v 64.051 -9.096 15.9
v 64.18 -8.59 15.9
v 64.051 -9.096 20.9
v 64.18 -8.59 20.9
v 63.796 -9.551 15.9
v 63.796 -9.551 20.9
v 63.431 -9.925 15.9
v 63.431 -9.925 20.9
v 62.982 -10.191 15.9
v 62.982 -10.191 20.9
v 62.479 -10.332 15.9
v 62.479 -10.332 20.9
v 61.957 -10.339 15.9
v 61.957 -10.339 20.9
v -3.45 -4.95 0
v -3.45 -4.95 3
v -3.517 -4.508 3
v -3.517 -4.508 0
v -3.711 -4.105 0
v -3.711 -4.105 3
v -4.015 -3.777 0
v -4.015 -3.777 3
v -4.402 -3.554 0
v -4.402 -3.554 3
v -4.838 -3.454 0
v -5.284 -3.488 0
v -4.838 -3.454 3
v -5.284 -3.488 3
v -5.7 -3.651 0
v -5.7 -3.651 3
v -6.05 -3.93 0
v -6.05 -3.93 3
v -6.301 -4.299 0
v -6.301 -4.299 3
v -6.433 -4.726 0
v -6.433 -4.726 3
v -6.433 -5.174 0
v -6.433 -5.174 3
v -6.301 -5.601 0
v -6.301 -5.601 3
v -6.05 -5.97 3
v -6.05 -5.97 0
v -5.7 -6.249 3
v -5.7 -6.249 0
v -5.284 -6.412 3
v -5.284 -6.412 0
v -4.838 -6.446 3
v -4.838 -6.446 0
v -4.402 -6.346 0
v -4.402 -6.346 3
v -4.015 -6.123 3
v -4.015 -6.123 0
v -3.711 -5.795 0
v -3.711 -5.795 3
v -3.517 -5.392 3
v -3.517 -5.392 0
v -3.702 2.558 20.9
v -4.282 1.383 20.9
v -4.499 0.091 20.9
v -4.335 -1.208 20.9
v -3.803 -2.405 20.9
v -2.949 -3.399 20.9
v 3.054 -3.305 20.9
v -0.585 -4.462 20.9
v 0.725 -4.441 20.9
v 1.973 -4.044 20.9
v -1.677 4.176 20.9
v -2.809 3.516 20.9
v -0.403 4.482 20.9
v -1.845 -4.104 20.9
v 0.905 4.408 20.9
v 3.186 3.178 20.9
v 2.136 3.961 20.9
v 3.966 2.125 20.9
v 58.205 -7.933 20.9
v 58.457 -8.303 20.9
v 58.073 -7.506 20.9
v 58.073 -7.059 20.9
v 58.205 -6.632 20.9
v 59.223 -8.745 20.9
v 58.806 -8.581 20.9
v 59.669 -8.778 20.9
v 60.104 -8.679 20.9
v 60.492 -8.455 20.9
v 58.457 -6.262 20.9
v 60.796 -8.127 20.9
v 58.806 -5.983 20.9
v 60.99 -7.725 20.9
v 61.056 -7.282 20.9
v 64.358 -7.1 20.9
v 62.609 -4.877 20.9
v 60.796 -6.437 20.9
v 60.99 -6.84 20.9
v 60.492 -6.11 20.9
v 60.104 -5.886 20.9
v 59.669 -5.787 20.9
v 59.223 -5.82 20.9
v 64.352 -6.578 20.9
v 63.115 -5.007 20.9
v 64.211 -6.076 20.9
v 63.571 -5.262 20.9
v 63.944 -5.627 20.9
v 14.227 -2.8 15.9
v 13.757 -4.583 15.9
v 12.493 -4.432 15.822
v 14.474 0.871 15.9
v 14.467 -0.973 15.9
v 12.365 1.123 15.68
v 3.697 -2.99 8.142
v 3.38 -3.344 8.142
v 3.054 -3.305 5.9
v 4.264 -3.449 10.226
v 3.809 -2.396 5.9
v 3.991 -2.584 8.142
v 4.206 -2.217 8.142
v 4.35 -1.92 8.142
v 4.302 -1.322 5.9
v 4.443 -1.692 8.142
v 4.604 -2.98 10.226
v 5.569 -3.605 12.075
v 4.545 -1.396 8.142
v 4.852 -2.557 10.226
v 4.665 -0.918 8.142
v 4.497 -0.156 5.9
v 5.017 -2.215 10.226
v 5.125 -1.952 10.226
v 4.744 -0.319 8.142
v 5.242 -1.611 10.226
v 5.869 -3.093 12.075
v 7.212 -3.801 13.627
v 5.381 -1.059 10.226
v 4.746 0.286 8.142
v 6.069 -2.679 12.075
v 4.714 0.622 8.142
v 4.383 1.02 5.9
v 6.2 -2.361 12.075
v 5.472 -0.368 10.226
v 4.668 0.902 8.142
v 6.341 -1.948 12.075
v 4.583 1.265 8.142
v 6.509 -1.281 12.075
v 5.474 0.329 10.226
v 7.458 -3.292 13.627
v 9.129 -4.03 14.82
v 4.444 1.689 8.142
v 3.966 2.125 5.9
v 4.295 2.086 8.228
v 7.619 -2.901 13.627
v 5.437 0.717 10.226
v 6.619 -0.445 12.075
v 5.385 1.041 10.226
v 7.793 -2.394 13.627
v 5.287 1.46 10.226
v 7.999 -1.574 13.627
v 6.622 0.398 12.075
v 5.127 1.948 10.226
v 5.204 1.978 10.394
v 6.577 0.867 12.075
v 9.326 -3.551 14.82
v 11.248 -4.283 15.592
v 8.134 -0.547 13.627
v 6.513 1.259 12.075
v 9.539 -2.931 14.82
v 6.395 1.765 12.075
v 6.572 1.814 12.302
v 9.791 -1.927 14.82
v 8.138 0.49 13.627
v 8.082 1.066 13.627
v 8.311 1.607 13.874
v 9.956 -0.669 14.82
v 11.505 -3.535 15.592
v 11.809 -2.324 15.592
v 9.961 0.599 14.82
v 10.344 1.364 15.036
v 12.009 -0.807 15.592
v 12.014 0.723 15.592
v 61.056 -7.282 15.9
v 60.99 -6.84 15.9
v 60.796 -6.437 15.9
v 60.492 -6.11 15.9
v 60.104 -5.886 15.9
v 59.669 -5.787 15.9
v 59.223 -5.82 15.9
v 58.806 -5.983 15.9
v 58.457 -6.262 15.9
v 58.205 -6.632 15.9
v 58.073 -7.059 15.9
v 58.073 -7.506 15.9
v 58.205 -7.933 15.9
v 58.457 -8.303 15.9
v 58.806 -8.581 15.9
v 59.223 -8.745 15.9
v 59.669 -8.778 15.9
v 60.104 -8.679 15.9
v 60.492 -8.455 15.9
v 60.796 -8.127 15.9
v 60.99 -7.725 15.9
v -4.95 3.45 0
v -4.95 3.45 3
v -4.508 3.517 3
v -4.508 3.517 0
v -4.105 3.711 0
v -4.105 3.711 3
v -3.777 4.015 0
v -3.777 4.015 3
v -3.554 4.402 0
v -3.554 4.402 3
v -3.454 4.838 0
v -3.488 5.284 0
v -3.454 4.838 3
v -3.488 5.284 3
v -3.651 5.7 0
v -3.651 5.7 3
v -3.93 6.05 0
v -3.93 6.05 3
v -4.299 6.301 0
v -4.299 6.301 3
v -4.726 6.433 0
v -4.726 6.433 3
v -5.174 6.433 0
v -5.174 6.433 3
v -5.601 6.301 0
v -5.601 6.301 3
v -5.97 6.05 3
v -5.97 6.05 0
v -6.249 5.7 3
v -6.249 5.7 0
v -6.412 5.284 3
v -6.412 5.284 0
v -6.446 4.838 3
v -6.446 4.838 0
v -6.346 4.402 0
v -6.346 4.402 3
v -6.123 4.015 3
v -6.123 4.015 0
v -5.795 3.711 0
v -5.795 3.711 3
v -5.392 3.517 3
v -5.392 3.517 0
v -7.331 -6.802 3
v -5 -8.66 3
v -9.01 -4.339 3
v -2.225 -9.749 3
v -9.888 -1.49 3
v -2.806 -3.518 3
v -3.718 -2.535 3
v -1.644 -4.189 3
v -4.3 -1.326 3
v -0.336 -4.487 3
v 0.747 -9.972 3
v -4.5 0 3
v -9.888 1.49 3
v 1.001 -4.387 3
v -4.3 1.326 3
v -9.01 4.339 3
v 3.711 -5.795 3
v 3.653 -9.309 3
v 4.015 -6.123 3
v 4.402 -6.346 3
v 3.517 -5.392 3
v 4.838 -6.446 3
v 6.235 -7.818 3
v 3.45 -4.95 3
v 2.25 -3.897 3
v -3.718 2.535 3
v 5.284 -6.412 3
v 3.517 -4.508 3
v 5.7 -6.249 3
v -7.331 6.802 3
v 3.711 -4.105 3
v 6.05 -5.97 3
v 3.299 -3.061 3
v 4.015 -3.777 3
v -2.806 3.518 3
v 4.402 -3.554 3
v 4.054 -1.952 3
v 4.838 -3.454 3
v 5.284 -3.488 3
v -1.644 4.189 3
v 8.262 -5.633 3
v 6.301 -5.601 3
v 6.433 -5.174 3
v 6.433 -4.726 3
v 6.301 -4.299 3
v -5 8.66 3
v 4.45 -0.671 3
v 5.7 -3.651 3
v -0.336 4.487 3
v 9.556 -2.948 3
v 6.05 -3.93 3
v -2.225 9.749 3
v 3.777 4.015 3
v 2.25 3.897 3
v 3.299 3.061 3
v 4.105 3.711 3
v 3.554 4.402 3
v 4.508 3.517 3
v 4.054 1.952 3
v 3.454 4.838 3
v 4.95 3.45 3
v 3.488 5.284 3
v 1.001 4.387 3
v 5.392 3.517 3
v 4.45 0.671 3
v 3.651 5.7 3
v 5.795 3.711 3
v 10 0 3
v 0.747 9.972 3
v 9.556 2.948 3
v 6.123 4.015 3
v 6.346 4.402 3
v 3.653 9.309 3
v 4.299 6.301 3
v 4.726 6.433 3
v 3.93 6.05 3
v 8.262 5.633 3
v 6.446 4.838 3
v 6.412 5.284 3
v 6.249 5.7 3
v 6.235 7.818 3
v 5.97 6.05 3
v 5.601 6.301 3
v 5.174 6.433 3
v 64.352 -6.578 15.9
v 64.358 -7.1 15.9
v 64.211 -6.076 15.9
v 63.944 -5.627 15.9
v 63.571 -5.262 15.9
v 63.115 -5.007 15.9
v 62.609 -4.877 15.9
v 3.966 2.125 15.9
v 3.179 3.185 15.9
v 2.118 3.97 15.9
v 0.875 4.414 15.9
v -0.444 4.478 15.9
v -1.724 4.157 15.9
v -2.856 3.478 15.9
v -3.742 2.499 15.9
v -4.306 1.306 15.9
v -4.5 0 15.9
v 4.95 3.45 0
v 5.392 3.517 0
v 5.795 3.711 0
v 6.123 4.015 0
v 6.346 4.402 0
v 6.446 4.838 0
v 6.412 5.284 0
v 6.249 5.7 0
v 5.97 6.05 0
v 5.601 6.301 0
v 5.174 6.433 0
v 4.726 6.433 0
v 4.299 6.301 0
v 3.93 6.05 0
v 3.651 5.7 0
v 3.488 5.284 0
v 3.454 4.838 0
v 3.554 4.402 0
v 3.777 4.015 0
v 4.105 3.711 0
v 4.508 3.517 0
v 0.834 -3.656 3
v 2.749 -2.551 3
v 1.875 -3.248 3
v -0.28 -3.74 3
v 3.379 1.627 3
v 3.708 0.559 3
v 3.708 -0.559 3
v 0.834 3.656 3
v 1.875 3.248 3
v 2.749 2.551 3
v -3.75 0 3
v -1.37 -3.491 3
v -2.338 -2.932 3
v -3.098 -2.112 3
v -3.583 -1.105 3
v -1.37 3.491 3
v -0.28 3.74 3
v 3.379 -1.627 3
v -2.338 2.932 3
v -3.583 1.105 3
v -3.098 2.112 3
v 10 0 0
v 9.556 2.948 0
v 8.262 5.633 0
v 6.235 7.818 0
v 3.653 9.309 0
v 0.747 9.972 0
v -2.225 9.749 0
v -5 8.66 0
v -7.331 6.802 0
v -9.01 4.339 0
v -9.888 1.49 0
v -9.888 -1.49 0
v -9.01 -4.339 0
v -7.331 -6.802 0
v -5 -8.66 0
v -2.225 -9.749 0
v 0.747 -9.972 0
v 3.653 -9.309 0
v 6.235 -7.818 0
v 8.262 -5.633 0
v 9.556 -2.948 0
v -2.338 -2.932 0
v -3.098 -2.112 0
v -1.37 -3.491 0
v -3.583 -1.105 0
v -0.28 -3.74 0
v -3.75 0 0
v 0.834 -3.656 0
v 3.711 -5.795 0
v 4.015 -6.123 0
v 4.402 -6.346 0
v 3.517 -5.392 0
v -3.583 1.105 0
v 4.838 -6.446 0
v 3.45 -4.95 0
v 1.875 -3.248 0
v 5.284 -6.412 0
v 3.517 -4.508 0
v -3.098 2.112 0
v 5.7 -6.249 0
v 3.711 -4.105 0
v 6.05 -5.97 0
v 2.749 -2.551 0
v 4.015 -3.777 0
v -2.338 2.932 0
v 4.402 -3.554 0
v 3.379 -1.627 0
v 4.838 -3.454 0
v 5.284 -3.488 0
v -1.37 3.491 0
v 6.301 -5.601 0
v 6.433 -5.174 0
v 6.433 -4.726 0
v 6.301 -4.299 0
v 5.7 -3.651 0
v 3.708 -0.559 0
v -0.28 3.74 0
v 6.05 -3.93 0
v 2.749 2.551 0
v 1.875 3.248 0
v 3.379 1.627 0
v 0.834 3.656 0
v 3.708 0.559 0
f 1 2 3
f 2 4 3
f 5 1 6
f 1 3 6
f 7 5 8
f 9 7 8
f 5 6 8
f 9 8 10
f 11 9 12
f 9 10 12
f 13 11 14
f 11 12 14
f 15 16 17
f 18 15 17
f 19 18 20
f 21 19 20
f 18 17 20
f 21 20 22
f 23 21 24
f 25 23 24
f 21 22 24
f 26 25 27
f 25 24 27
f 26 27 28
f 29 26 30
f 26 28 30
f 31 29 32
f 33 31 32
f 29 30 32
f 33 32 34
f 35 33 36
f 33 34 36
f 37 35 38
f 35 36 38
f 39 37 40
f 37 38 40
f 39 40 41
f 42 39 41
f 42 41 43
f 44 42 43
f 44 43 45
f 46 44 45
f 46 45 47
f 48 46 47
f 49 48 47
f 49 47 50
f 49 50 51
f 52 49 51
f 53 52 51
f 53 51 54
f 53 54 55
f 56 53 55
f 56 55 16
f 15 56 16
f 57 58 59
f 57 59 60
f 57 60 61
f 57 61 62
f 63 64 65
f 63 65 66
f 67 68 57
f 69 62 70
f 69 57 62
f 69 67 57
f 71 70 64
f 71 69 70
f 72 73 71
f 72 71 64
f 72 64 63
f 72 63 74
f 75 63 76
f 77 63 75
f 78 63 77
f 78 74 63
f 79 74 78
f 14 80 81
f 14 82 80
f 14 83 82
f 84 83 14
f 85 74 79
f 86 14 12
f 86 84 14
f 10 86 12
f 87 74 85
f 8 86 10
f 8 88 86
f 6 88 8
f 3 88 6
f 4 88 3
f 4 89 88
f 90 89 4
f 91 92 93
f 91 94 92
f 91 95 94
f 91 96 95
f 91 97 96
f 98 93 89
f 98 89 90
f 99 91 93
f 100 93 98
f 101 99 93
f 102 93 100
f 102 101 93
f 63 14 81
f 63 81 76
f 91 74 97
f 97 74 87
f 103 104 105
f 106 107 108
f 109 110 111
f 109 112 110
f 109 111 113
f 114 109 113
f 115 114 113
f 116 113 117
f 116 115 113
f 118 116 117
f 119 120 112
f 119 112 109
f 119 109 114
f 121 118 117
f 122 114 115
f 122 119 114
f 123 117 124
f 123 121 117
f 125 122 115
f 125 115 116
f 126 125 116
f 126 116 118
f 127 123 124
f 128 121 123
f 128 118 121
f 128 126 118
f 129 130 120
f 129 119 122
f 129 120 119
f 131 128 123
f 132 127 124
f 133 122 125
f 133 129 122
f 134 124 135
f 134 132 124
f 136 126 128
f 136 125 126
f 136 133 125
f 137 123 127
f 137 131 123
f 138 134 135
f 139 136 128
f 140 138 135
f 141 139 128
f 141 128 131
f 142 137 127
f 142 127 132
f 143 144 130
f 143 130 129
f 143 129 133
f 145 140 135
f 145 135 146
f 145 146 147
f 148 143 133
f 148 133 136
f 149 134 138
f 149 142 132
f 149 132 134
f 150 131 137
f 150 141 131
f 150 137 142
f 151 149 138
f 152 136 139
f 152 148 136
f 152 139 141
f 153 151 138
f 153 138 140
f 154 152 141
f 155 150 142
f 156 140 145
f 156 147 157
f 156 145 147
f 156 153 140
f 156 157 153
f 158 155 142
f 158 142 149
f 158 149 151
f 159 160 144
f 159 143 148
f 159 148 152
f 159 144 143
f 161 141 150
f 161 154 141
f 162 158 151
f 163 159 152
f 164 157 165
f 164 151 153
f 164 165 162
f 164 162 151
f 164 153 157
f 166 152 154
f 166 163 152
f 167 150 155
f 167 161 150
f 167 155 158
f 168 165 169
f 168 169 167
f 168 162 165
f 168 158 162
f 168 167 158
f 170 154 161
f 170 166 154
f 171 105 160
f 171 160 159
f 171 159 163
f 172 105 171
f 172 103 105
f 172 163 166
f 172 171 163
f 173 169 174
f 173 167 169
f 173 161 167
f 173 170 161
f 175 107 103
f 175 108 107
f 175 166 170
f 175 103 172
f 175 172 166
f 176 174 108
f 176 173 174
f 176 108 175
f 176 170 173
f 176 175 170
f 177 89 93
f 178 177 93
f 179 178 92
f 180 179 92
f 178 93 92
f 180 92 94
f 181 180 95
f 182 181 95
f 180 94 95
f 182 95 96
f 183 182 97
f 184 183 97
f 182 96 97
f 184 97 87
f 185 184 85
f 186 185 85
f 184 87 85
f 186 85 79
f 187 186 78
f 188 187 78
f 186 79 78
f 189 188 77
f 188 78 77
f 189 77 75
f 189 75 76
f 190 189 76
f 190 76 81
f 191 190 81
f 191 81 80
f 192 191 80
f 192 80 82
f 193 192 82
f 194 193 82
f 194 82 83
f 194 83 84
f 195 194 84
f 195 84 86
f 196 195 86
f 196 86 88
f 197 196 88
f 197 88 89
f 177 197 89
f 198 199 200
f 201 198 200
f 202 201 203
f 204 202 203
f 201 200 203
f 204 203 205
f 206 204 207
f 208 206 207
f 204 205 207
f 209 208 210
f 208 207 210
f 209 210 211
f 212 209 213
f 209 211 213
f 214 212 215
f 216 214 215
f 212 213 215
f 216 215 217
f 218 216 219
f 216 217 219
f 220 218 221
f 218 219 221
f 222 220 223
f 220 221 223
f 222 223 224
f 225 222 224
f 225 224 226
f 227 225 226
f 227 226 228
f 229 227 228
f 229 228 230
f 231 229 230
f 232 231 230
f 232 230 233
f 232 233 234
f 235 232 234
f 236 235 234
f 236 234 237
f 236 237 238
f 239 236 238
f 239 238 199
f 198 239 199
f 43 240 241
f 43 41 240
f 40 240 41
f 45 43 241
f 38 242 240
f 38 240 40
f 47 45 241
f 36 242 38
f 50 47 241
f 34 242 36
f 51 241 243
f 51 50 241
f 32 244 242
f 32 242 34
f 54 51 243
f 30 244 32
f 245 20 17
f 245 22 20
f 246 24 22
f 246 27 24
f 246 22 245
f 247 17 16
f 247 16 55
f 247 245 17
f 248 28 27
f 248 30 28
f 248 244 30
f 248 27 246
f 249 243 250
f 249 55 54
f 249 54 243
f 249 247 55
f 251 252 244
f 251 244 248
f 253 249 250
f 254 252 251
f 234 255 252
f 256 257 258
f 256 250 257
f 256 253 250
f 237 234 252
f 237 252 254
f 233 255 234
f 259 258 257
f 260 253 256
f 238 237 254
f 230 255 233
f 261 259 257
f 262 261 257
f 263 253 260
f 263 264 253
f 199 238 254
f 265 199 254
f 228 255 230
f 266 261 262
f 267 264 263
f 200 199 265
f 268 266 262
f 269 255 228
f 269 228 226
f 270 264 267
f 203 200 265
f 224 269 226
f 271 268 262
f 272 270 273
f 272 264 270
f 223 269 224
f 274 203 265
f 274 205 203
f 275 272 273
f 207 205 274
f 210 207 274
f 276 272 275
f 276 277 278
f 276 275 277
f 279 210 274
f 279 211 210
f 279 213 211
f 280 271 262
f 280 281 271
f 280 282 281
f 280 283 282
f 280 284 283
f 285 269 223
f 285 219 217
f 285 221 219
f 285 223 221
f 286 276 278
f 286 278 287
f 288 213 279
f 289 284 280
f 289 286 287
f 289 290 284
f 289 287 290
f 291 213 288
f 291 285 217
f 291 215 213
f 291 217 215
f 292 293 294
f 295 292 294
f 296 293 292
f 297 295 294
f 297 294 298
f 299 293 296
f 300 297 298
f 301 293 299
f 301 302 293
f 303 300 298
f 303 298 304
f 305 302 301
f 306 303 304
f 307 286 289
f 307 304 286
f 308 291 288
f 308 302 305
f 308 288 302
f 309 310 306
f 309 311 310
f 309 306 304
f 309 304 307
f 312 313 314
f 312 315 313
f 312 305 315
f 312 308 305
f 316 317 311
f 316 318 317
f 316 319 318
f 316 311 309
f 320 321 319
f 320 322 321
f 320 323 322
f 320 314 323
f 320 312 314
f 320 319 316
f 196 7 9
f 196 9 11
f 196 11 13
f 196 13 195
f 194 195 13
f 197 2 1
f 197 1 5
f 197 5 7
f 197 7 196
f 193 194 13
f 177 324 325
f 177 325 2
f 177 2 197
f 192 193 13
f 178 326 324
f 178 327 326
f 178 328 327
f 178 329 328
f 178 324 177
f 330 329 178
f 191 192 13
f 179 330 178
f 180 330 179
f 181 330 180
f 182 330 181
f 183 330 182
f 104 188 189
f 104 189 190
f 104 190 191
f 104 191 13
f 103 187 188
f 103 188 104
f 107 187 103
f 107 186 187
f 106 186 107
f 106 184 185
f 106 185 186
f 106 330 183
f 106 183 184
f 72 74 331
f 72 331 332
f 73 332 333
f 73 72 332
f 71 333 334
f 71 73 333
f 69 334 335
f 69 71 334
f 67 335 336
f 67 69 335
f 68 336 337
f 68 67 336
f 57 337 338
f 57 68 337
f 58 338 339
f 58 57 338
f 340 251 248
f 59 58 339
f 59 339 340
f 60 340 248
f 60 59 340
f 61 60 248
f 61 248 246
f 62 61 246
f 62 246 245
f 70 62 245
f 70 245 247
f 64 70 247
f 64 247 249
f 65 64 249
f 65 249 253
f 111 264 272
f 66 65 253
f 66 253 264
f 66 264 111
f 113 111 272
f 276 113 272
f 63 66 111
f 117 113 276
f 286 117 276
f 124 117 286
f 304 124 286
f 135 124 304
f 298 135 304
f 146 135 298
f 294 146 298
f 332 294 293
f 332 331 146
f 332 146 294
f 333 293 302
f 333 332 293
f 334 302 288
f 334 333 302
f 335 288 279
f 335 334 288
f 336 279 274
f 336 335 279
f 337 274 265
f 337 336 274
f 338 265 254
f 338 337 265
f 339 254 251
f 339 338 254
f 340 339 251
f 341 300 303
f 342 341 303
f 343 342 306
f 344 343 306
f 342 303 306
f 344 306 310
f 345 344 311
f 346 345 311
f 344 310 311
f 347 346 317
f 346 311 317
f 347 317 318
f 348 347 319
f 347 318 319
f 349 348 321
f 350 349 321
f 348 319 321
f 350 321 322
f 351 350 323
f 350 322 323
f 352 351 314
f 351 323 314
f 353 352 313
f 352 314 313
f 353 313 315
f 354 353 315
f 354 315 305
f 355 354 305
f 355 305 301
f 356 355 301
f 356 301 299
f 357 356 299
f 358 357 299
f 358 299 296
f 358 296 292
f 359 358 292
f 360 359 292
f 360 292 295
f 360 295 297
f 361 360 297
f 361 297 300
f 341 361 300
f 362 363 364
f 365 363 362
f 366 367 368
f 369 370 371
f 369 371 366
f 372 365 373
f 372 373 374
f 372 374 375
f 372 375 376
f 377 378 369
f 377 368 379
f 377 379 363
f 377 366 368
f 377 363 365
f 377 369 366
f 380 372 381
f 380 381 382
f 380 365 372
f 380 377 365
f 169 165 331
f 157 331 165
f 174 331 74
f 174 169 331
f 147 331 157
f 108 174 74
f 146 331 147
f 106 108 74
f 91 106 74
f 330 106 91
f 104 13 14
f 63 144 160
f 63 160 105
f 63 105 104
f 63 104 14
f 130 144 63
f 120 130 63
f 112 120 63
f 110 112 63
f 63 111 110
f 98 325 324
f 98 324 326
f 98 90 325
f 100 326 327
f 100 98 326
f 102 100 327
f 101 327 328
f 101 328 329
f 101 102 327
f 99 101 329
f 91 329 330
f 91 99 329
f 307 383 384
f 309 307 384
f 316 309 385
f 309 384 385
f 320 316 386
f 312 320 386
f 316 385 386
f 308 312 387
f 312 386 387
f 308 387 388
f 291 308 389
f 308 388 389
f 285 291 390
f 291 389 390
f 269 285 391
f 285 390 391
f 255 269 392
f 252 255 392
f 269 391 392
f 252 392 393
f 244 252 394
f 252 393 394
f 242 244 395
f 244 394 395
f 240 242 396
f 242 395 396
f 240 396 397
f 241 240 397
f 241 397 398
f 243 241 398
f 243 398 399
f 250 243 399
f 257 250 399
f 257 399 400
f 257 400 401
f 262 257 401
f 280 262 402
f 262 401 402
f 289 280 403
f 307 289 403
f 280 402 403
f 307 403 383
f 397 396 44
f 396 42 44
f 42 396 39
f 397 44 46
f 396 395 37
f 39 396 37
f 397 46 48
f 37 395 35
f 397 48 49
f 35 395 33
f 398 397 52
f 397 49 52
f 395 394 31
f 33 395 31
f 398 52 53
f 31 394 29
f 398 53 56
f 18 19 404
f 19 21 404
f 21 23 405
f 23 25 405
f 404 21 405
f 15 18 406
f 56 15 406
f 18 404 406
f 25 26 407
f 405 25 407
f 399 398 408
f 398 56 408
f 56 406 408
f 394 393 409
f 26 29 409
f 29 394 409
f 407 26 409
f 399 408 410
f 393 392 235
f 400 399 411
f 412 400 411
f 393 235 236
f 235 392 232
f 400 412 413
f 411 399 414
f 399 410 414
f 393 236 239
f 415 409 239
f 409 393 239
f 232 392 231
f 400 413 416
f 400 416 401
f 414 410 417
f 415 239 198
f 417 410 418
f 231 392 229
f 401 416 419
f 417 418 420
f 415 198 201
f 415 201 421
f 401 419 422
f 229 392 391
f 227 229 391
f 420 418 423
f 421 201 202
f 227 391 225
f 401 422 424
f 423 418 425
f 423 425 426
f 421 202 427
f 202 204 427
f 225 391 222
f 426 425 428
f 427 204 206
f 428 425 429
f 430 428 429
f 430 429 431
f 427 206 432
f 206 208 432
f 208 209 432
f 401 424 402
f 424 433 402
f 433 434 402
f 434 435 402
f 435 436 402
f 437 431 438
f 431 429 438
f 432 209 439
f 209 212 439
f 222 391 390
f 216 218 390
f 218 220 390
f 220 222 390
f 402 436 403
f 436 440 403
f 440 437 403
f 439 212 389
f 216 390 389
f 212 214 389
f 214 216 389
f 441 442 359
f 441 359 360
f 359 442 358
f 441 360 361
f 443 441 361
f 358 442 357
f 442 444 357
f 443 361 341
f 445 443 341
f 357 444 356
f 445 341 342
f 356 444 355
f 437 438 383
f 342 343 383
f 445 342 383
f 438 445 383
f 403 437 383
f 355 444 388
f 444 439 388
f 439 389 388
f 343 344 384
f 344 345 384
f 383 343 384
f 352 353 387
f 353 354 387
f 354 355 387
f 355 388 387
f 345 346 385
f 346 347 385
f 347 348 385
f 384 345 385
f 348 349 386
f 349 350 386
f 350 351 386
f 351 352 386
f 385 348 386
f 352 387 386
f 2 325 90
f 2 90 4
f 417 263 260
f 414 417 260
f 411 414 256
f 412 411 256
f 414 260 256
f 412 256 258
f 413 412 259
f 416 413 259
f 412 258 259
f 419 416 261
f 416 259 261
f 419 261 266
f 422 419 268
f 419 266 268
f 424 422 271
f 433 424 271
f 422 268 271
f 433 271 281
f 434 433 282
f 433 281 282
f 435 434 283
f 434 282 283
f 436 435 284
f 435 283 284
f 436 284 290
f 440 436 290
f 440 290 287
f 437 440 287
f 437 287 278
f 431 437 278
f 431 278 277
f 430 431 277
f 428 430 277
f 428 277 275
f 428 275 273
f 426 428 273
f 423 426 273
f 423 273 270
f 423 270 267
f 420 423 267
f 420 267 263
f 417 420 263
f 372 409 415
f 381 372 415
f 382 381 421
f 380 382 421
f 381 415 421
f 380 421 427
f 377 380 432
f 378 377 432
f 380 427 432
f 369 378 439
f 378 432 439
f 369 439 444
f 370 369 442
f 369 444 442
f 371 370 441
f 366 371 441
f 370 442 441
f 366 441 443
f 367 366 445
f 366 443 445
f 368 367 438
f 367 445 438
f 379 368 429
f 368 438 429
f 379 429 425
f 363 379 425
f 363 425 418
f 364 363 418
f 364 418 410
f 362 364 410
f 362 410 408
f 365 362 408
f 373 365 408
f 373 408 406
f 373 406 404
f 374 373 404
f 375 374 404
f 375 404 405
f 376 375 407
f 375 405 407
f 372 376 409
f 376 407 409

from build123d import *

# Parameters (mm, degrees)
SKETCH_1_R          = 10
EXTRUDE_1_DEPTH     = 3
SKETCH_2_R          = 1.5
CUT_EXTRUDE_1_DEPTH = 15.45683229480096
EXTRUDE_START       = 12.9
SKETCH_3_R          = 4.5
SKETCH_3_R_2        = 1.5000000000000002
EXTRUDE_2_DEPTH     = 12.9
EXTRUDE_START_2     = -15.9
SKETCH_4_R          = 1.5000000000000002
EXTRUDE_4_DEPTH     = 15.9
EXTRUDE_5_DEPTH     = 5
SKETCH_6_R          = 1.4999999999999751
CUT_EXTRUDE_2_DEPTH = 69.71105565006431
EXTRUDE_START_3     = 5
EXTRUDE_8_DEPTH     = 5
FILLET_1_R          = 10
FILLET_2_R          = 2
SKETCH_8_R          = 3.75
CUT_EXTRUDE_3_DEPTH = 3


with BuildPart() as part:
    # 草图1 → 凸台-拉伸1 (new body)
    with BuildSketch(Plane.XY):
        Circle(SKETCH_1_R)
    extrude(amount=EXTRUDE_1_DEPTH)

    # 草图2 → 切除-拉伸1 (cut, through all)
    with BuildSketch(Plane.XY.offset(3)):
        with BuildLine():
            ThreePointArc((-3.4499999999999966, 4.9499999999999975), (-6.010660171779826, 6.010660171779813), (-4.949999999999979, 3.4499999999999966))
            Line((-4.9499999999999975, 3.4499999999999966), (-4.9499999999999975, 4.949999999999997))
            Line((-4.9499999999999975, 4.9499999999999975), (-3.4499999999999957, 4.9499999999999975))
        make_face()
        with BuildLine():
            Line((-4.9499999999999975, 4.949999999999997), (-4.9499999999999975, 3.4499999999999966))
            ThreePointArc((-4.949999999999979, 3.4499999999999966), (-3.8893398282201694, 3.889339828220182), (-3.4499999999999966, 4.9499999999999975))
            Line((-3.4499999999999957, 4.9499999999999975), (-4.9499999999999975, 4.9499999999999975))
        make_face()
        with BuildLine():
            ThreePointArc((3.450000000000002, 4.95), (3.889339828220187, 3.889339828220172), (4.9500000000000215, 3.4499999999999993))
            Line((4.950000000000003, 3.4499999999999984), (4.950000000000003, 4.95))
            Line((4.950000000000003, 4.95), (3.450000000000002, 4.95))
        make_face()
        with BuildLine():
            Line((4.950000000000003, 4.95), (4.950000000000003, 3.4499999999999984))
            ThreePointArc((4.9500000000000215, 3.4499999999999993), (6.010660171779831, 3.8893398282201845), (6.450000000000004, 4.95))
            ThreePointArc((6.450000000000004, 4.95), (4.950000000000003, 6.450000000000001), (3.450000000000002, 4.95))
            Line((3.450000000000002, 4.95), (4.950000000000003, 4.95))
        make_face()
        with BuildLine():
            ThreePointArc((-4.949999999999978, -3.450000000000001), (-6.0106601717798265, -6.010660171779817), (-3.4499999999999966, -4.950000000000002))
            Line((-3.4499999999999957, -4.950000000000002), (-4.9499999999999975, -4.950000000000002))
            Line((-4.9499999999999975, -4.950000000000002), (-4.9499999999999975, -3.450000000000001))
        make_face()
        with BuildLine():
            Line((-4.9499999999999975, -4.950000000000002), (-3.4499999999999957, -4.950000000000002))
            ThreePointArc((-3.4499999999999966, -4.950000000000002), (-3.8893398282201685, -3.889339828220187), (-4.949999999999978, -3.450000000000001))
            Line((-4.9499999999999975, -3.450000000000001), (-4.9499999999999975, -4.950000000000002))
        make_face()
        with BuildLine():
            ThreePointArc((4.950000000000022, -3.4499999999999993), (3.889339828220188, -3.8893398282201717), (3.450000000000002, -4.95))
            Line((3.450000000000002, -4.95), (4.950000000000003, -4.95))
            Line((4.950000000000003, -4.95), (4.950000000000003, -3.4499999999999993))
        make_face()
        with BuildLine():
            Line((4.950000000000003, -4.95), (3.450000000000002, -4.95))
            ThreePointArc((3.450000000000002, -4.95), (4.950000000000003, -6.450000000000001), (6.450000000000004, -4.95))
            ThreePointArc((6.450000000000004, -4.95), (6.010660171779832, -3.8893398282201854), (4.950000000000022, -3.4499999999999993))
            Line((4.950000000000003, -3.4499999999999993), (4.950000000000003, -4.95))
        make_face()
        Circle(SKETCH_2_R)
    extrude(amount=-CUT_EXTRUDE_1_DEPTH, mode=Mode.SUBTRACT)

    # 草图3 → 凸台-拉伸2 (add)
    with BuildSketch(Plane.XY.offset(3).offset(EXTRUDE_START)):
        with Locations(Location((0, 0, 0), (0, 0, 180))):
            Circle(SKETCH_3_R)
        Circle(SKETCH_3_R_2, mode=Mode.SUBTRACT)
    extrude(amount=-EXTRUDE_2_DEPTH)

    # 草图4 → 凸台-拉伸4 (add)
    with BuildSketch(Plane(origin=(0, 0, 0), x_dir=(-1, 0, 0), z_dir=(0, 0, -1)).offset(EXTRUDE_START_2)):
        Circle(SKETCH_4_R)
    extrude(amount=EXTRUDE_4_DEPTH)

    # 草图5 → 凸台-拉伸5 (add)
    with BuildSketch(Plane.XY.offset(15.9)):
        Polygon((64.59529016246847, -5.1146065812479), (63.94313316774814, -10.575805282470675), (-0.5983060285210257, -2.8684953448666564), (0.05385096619931135, 2.5927033563560817), align=None)
    extrude(amount=EXTRUDE_5_DEPTH)

    # 草图6 → 切除-拉伸2 (cut, through all)
    with BuildSketch(Plane.XY.offset(20.900000000000002)):
        with Locations((59.55641321806875, -7.28242024320529)):
            Circle(SKETCH_6_R)
    extrude(amount=-CUT_EXTRUDE_2_DEPTH, mode=Mode.SUBTRACT)

    # 草图7 → 凸台-拉伸8 (add)
    with BuildSketch(Plane.XY.offset(15.9).offset(EXTRUDE_START_3)):
        with BuildLine():
            Line((0.05385096619931135, 2.5927033563560817), (3.9664004294167037, 2.1254805653129325))
            ThreePointArc((3.9664004294167037, 2.1254805653129325), (-4.4378387444626375, 0.7453772723569406), (3.054352769395848, -3.3046829136974565))
            Line((3.054352769395848, -3.3046829136974565), (-0.5983060285210257, -2.8684953448666564))
            Line((-0.5983060285210257, -2.8684953448666564), (0.05385096619931135, 2.5927033563560817))
        make_face()
    extrude(amount=-EXTRUDE_8_DEPTH)

    # 圆角1
    fillet_1_edges = [part.edges().sort_by_distance(p)[0] for p in [
        (4.437838744462656, -0.7453772723568349, 15.9),
    ]]
    fillet(fillet_1_edges, radius=FILLET_1_R)

    # 圆角2
    fillet_2_edges = [part.edges().sort_by_distance(p)[0] for p in [
        (63.94313316774814, -10.575805282470675, 18.4),
        (64.59529016246847, -5.1146065812479, 18.4),
    ]]
    fillet(fillet_2_edges, radius=FILLET_2_R)

    # 草图8 → 切除-拉伸3 (cut)
    with BuildSketch(Plane(origin=(0, 0, 0), x_dir=(-1, 0, 0), z_dir=(0, 0, -1))):
        Circle(SKETCH_8_R)
    extrude(amount=-CUT_EXTRUDE_3_DEPTH, mode=Mode.SUBTRACT)


solid = part.part
